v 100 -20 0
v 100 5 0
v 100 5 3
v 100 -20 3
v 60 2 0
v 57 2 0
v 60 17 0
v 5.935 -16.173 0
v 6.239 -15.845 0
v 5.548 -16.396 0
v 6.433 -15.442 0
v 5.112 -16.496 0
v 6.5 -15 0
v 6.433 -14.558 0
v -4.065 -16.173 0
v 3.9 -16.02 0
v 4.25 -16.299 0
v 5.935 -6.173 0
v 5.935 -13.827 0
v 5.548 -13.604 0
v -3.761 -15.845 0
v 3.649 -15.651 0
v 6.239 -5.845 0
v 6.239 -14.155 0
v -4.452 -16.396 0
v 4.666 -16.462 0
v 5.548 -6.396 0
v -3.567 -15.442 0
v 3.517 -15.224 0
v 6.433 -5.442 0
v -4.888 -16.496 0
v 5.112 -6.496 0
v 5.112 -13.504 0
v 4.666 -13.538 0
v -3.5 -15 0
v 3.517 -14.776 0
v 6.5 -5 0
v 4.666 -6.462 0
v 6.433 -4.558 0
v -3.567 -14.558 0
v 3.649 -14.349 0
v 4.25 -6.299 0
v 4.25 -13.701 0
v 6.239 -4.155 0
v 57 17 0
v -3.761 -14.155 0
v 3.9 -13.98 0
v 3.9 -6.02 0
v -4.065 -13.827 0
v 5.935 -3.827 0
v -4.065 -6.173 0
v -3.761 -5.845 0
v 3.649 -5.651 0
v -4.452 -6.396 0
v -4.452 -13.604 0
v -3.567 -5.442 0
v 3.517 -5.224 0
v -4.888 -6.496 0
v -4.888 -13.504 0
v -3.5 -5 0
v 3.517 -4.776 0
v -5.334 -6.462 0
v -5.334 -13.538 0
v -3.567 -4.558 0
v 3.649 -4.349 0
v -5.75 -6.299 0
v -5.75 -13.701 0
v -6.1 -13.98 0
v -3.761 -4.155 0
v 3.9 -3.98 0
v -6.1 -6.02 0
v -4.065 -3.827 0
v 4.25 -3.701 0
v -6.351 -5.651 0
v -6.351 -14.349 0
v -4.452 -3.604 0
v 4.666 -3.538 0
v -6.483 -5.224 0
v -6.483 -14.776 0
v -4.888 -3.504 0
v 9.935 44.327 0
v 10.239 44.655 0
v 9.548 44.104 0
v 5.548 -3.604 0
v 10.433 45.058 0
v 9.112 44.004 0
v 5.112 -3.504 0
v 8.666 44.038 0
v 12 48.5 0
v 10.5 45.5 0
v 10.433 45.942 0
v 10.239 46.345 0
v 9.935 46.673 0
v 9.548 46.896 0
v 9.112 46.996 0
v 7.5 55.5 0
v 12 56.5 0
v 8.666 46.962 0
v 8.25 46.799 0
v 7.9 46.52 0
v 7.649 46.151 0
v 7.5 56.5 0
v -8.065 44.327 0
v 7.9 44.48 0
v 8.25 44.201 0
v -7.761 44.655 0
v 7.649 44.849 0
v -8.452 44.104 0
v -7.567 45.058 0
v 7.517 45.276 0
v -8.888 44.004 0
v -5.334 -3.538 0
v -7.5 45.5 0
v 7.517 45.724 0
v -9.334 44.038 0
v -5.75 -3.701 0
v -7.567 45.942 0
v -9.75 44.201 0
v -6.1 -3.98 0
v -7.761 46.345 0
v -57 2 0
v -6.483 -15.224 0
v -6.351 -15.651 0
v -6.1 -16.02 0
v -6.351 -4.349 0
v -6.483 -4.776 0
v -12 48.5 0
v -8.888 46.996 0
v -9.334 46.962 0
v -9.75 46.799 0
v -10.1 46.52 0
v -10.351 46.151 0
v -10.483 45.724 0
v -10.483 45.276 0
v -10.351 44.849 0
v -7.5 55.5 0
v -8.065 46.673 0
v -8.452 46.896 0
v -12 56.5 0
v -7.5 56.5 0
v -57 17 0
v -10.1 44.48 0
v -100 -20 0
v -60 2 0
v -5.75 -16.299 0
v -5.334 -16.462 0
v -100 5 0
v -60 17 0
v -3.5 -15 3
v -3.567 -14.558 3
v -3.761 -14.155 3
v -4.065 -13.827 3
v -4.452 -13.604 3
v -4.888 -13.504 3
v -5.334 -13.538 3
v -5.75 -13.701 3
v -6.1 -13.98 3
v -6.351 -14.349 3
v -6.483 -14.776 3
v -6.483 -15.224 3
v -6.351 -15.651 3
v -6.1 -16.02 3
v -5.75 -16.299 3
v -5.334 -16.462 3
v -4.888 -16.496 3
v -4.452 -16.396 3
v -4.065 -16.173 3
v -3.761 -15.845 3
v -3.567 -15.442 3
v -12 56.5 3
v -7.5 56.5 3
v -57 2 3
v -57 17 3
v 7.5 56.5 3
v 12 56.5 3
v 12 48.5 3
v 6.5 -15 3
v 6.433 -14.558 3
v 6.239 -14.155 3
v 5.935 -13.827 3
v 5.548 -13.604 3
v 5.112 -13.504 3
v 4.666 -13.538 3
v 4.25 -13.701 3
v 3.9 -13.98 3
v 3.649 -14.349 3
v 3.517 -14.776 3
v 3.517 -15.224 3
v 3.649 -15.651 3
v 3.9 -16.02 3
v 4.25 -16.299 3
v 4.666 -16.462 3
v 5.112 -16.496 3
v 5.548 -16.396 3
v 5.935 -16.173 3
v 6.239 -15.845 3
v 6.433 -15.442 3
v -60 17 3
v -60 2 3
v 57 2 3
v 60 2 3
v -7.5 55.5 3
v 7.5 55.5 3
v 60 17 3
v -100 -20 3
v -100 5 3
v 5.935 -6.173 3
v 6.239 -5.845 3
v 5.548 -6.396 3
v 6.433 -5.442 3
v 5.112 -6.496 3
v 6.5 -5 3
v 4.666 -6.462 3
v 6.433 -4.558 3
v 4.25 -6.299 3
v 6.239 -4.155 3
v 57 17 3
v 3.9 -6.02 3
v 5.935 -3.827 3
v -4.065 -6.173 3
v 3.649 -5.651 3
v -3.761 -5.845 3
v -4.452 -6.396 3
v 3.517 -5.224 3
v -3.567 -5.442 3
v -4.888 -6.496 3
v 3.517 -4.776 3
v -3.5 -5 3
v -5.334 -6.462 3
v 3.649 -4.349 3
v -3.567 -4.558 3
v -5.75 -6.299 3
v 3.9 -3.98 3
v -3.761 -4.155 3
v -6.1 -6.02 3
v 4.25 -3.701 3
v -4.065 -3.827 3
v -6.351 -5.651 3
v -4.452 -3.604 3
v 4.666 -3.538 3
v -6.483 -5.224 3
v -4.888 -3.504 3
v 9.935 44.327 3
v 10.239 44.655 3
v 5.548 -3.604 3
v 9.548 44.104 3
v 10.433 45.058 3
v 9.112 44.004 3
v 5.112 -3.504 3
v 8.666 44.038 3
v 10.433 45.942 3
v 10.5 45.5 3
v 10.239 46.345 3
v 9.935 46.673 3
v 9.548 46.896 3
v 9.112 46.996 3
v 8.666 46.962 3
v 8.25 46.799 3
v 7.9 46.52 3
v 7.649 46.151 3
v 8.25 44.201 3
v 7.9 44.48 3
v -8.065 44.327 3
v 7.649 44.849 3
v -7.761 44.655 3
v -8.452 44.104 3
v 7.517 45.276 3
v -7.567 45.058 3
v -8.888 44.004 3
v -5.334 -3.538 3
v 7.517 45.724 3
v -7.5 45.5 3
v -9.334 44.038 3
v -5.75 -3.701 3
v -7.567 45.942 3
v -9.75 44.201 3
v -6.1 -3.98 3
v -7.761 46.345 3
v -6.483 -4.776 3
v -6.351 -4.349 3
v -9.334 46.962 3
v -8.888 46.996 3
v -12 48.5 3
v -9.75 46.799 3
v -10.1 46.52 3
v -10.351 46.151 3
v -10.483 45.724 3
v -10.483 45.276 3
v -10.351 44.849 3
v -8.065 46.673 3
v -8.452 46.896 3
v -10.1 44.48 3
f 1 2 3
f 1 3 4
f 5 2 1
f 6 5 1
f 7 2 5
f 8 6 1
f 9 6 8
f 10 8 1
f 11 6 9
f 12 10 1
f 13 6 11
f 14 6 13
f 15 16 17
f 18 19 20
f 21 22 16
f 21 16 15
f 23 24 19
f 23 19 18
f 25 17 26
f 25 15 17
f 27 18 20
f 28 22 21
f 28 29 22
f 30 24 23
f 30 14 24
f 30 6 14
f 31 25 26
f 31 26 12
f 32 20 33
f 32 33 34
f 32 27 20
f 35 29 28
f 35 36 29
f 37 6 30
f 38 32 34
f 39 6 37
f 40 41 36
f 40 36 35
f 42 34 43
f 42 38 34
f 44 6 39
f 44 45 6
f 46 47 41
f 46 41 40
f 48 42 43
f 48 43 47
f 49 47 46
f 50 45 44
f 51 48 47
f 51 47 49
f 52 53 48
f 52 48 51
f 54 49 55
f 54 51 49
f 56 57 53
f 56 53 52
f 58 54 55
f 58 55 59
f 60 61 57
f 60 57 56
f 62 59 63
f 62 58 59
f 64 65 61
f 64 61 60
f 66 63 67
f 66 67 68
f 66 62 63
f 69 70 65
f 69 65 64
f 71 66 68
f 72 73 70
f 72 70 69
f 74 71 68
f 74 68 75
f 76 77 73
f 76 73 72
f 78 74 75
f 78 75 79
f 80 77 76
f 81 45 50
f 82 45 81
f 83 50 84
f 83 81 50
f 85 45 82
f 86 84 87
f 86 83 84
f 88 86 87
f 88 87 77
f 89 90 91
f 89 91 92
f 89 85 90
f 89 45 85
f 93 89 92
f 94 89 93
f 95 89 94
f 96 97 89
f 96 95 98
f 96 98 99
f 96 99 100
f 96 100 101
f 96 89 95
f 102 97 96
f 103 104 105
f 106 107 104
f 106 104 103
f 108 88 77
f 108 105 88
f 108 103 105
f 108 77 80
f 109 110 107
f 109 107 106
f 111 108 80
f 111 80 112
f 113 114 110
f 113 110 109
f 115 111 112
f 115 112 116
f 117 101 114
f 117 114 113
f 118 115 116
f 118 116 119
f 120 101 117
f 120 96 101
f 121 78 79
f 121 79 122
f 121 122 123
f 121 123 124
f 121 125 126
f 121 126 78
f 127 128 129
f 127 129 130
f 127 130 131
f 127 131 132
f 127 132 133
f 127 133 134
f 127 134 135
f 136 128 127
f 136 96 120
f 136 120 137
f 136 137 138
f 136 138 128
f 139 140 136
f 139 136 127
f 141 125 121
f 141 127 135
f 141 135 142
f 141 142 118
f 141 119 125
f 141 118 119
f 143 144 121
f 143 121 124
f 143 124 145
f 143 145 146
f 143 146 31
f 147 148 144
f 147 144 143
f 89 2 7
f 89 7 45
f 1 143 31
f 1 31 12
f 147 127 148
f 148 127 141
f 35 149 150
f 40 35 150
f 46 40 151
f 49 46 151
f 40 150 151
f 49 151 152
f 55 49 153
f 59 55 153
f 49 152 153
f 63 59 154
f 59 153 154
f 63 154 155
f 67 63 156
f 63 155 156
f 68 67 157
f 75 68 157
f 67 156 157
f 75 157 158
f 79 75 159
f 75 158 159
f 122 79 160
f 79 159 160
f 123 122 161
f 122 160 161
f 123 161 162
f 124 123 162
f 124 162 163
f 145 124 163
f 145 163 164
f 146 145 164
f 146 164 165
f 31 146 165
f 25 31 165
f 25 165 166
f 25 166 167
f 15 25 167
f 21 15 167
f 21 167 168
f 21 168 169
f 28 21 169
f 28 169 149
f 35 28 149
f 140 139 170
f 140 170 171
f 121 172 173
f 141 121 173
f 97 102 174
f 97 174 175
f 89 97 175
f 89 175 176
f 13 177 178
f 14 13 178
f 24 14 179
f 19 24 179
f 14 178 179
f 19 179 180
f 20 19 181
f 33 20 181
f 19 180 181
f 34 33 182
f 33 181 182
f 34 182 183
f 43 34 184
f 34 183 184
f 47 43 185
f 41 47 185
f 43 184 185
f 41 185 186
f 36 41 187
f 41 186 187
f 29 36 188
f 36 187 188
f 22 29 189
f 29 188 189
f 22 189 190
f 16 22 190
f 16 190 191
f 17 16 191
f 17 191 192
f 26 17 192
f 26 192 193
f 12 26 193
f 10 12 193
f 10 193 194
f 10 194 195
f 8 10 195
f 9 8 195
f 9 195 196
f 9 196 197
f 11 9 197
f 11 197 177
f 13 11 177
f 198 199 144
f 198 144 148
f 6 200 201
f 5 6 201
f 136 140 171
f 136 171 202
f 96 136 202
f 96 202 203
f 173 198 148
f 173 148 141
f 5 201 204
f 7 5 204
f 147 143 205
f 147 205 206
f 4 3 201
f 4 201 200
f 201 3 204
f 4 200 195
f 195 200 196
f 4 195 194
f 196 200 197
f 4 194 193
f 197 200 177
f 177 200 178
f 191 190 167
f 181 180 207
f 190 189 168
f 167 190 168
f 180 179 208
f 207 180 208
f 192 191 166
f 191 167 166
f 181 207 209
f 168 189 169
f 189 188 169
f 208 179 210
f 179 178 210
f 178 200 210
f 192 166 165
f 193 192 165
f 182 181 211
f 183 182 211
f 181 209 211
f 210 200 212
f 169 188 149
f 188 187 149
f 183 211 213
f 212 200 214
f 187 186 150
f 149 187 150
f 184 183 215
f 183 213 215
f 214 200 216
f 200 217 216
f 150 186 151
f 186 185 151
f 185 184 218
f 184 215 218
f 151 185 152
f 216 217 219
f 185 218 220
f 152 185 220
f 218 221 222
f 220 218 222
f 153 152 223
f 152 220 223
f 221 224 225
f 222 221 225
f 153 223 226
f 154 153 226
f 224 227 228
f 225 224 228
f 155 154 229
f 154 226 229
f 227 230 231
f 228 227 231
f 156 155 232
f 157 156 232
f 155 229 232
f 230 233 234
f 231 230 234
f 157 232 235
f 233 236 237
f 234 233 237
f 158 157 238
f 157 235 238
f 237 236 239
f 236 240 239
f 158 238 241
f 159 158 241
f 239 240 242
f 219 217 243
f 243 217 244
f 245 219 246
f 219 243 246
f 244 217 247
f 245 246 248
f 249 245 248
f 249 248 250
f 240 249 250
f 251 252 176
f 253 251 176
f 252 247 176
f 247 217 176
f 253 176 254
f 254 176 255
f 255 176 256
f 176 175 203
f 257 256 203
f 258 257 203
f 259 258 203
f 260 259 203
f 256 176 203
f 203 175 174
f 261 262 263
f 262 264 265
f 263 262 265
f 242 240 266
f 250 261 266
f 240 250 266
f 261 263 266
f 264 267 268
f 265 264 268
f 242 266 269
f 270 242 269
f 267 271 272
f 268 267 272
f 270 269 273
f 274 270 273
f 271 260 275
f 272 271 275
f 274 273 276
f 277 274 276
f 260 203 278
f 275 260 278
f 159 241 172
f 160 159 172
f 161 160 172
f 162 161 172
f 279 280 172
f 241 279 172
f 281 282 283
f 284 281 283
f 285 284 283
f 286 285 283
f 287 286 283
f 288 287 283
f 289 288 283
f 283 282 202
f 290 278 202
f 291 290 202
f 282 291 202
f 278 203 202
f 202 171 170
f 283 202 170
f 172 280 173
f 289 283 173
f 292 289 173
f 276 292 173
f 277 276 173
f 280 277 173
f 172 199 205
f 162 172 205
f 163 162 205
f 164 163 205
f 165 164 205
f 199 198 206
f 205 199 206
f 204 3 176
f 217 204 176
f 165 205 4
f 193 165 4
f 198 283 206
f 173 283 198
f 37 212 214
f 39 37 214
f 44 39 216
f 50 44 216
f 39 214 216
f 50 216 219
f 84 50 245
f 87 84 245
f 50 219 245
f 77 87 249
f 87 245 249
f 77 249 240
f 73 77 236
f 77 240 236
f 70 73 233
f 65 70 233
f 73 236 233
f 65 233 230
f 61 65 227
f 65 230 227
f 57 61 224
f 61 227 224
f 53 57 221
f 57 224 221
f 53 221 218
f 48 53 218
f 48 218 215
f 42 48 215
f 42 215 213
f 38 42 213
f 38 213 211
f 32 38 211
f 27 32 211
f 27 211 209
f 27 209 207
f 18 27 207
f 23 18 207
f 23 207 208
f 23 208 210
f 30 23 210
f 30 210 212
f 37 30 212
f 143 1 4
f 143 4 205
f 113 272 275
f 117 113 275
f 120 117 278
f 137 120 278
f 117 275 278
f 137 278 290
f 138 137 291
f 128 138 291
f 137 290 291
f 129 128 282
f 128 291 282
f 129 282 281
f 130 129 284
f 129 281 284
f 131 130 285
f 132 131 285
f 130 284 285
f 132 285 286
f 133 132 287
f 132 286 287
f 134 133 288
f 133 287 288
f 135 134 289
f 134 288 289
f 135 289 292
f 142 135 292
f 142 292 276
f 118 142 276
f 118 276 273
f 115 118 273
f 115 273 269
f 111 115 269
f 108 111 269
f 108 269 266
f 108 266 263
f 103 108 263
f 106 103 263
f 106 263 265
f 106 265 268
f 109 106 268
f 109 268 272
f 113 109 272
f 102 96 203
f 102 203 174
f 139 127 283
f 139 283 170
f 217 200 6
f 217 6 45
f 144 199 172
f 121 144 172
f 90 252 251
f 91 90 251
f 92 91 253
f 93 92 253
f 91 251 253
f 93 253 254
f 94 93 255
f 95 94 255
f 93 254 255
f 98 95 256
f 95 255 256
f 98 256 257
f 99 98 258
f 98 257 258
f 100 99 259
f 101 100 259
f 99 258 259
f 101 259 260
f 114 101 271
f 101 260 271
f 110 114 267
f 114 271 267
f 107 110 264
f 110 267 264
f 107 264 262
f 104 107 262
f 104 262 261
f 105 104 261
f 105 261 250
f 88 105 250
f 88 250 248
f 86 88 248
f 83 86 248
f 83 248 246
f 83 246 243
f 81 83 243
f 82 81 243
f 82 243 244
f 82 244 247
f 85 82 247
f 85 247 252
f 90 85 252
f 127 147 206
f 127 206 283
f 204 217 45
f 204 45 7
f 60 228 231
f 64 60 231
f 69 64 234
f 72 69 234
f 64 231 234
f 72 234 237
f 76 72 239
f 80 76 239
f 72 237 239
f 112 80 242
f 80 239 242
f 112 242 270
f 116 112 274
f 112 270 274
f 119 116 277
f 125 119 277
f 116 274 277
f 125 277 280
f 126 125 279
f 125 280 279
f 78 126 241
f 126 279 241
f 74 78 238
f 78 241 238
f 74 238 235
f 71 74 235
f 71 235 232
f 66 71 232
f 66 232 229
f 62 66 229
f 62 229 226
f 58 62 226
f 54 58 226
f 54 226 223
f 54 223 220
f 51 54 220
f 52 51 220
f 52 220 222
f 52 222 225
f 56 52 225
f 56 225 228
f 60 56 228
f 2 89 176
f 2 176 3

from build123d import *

# Parameters (mm, degrees)
EXTRUDE_1_DEPTH     = 3
SKETCH_4_R          = 1.5
CUT_EXTRUDE_2_DEPTH = 5
SKETCH_6_R          = 1.5
CUT_EXTRUDE_4_DEPTH = 5
SKETCH_7_W          = 3
SKETCH_7_H          = 15
CUT_EXTRUDE_5_DEPTH = 10


with BuildPart() as part:
    # 草图2 → 凸台-拉伸1 (new body)
    with BuildSketch(Plane.XY):
        Polygon((-7.5, 56.5), (-7.5, 55.5), (7.5, 55.5), (7.5, 56.5), (12, 56.5), (12, 48.5), (100, 5), (100, -20), (-100, -20), (-100, 5), (-12, 48.5), (-12, 56.5), align=None)
    extrude(amount=EXTRUDE_1_DEPTH)

    # 草图4 → 切除-拉伸2 (cut)
    with BuildSketch(Plane.XY.offset(3)):
        with Locations((-5, -5)):
            Circle(SKETCH_4_R)
        with Locations((5, -5)):
            Circle(SKETCH_4_R)
        with Locations((-5, -15)):
            Circle(SKETCH_4_R)
        with Locations((5, -15)):
            Circle(SKETCH_4_R)
    extrude(amount=-CUT_EXTRUDE_2_DEPTH, mode=Mode.SUBTRACT)

    # 草图6 → 切除-拉伸4 (cut)
    with BuildSketch(Plane.XY.offset(3)):
        with Locations((-9, 45.5)):
            Circle(SKETCH_6_R)
        with Locations((9, 45.5)):
            Circle(SKETCH_6_R)
    extrude(amount=-CUT_EXTRUDE_4_DEPTH, mode=Mode.SUBTRACT)

    # 草图7 → 切除-拉伸5 (cut)
    with BuildSketch(Plane.XY.offset(3)):
        with Locations((-58.5, 9.5)):
            Rectangle(SKETCH_7_W, SKETCH_7_H)
        with Locations((58.5, 9.5)):
            Rectangle(SKETCH_7_W, SKETCH_7_H)
    extrude(amount=-CUT_EXTRUDE_5_DEPTH, mode=Mode.SUBTRACT)


solid = part.part
